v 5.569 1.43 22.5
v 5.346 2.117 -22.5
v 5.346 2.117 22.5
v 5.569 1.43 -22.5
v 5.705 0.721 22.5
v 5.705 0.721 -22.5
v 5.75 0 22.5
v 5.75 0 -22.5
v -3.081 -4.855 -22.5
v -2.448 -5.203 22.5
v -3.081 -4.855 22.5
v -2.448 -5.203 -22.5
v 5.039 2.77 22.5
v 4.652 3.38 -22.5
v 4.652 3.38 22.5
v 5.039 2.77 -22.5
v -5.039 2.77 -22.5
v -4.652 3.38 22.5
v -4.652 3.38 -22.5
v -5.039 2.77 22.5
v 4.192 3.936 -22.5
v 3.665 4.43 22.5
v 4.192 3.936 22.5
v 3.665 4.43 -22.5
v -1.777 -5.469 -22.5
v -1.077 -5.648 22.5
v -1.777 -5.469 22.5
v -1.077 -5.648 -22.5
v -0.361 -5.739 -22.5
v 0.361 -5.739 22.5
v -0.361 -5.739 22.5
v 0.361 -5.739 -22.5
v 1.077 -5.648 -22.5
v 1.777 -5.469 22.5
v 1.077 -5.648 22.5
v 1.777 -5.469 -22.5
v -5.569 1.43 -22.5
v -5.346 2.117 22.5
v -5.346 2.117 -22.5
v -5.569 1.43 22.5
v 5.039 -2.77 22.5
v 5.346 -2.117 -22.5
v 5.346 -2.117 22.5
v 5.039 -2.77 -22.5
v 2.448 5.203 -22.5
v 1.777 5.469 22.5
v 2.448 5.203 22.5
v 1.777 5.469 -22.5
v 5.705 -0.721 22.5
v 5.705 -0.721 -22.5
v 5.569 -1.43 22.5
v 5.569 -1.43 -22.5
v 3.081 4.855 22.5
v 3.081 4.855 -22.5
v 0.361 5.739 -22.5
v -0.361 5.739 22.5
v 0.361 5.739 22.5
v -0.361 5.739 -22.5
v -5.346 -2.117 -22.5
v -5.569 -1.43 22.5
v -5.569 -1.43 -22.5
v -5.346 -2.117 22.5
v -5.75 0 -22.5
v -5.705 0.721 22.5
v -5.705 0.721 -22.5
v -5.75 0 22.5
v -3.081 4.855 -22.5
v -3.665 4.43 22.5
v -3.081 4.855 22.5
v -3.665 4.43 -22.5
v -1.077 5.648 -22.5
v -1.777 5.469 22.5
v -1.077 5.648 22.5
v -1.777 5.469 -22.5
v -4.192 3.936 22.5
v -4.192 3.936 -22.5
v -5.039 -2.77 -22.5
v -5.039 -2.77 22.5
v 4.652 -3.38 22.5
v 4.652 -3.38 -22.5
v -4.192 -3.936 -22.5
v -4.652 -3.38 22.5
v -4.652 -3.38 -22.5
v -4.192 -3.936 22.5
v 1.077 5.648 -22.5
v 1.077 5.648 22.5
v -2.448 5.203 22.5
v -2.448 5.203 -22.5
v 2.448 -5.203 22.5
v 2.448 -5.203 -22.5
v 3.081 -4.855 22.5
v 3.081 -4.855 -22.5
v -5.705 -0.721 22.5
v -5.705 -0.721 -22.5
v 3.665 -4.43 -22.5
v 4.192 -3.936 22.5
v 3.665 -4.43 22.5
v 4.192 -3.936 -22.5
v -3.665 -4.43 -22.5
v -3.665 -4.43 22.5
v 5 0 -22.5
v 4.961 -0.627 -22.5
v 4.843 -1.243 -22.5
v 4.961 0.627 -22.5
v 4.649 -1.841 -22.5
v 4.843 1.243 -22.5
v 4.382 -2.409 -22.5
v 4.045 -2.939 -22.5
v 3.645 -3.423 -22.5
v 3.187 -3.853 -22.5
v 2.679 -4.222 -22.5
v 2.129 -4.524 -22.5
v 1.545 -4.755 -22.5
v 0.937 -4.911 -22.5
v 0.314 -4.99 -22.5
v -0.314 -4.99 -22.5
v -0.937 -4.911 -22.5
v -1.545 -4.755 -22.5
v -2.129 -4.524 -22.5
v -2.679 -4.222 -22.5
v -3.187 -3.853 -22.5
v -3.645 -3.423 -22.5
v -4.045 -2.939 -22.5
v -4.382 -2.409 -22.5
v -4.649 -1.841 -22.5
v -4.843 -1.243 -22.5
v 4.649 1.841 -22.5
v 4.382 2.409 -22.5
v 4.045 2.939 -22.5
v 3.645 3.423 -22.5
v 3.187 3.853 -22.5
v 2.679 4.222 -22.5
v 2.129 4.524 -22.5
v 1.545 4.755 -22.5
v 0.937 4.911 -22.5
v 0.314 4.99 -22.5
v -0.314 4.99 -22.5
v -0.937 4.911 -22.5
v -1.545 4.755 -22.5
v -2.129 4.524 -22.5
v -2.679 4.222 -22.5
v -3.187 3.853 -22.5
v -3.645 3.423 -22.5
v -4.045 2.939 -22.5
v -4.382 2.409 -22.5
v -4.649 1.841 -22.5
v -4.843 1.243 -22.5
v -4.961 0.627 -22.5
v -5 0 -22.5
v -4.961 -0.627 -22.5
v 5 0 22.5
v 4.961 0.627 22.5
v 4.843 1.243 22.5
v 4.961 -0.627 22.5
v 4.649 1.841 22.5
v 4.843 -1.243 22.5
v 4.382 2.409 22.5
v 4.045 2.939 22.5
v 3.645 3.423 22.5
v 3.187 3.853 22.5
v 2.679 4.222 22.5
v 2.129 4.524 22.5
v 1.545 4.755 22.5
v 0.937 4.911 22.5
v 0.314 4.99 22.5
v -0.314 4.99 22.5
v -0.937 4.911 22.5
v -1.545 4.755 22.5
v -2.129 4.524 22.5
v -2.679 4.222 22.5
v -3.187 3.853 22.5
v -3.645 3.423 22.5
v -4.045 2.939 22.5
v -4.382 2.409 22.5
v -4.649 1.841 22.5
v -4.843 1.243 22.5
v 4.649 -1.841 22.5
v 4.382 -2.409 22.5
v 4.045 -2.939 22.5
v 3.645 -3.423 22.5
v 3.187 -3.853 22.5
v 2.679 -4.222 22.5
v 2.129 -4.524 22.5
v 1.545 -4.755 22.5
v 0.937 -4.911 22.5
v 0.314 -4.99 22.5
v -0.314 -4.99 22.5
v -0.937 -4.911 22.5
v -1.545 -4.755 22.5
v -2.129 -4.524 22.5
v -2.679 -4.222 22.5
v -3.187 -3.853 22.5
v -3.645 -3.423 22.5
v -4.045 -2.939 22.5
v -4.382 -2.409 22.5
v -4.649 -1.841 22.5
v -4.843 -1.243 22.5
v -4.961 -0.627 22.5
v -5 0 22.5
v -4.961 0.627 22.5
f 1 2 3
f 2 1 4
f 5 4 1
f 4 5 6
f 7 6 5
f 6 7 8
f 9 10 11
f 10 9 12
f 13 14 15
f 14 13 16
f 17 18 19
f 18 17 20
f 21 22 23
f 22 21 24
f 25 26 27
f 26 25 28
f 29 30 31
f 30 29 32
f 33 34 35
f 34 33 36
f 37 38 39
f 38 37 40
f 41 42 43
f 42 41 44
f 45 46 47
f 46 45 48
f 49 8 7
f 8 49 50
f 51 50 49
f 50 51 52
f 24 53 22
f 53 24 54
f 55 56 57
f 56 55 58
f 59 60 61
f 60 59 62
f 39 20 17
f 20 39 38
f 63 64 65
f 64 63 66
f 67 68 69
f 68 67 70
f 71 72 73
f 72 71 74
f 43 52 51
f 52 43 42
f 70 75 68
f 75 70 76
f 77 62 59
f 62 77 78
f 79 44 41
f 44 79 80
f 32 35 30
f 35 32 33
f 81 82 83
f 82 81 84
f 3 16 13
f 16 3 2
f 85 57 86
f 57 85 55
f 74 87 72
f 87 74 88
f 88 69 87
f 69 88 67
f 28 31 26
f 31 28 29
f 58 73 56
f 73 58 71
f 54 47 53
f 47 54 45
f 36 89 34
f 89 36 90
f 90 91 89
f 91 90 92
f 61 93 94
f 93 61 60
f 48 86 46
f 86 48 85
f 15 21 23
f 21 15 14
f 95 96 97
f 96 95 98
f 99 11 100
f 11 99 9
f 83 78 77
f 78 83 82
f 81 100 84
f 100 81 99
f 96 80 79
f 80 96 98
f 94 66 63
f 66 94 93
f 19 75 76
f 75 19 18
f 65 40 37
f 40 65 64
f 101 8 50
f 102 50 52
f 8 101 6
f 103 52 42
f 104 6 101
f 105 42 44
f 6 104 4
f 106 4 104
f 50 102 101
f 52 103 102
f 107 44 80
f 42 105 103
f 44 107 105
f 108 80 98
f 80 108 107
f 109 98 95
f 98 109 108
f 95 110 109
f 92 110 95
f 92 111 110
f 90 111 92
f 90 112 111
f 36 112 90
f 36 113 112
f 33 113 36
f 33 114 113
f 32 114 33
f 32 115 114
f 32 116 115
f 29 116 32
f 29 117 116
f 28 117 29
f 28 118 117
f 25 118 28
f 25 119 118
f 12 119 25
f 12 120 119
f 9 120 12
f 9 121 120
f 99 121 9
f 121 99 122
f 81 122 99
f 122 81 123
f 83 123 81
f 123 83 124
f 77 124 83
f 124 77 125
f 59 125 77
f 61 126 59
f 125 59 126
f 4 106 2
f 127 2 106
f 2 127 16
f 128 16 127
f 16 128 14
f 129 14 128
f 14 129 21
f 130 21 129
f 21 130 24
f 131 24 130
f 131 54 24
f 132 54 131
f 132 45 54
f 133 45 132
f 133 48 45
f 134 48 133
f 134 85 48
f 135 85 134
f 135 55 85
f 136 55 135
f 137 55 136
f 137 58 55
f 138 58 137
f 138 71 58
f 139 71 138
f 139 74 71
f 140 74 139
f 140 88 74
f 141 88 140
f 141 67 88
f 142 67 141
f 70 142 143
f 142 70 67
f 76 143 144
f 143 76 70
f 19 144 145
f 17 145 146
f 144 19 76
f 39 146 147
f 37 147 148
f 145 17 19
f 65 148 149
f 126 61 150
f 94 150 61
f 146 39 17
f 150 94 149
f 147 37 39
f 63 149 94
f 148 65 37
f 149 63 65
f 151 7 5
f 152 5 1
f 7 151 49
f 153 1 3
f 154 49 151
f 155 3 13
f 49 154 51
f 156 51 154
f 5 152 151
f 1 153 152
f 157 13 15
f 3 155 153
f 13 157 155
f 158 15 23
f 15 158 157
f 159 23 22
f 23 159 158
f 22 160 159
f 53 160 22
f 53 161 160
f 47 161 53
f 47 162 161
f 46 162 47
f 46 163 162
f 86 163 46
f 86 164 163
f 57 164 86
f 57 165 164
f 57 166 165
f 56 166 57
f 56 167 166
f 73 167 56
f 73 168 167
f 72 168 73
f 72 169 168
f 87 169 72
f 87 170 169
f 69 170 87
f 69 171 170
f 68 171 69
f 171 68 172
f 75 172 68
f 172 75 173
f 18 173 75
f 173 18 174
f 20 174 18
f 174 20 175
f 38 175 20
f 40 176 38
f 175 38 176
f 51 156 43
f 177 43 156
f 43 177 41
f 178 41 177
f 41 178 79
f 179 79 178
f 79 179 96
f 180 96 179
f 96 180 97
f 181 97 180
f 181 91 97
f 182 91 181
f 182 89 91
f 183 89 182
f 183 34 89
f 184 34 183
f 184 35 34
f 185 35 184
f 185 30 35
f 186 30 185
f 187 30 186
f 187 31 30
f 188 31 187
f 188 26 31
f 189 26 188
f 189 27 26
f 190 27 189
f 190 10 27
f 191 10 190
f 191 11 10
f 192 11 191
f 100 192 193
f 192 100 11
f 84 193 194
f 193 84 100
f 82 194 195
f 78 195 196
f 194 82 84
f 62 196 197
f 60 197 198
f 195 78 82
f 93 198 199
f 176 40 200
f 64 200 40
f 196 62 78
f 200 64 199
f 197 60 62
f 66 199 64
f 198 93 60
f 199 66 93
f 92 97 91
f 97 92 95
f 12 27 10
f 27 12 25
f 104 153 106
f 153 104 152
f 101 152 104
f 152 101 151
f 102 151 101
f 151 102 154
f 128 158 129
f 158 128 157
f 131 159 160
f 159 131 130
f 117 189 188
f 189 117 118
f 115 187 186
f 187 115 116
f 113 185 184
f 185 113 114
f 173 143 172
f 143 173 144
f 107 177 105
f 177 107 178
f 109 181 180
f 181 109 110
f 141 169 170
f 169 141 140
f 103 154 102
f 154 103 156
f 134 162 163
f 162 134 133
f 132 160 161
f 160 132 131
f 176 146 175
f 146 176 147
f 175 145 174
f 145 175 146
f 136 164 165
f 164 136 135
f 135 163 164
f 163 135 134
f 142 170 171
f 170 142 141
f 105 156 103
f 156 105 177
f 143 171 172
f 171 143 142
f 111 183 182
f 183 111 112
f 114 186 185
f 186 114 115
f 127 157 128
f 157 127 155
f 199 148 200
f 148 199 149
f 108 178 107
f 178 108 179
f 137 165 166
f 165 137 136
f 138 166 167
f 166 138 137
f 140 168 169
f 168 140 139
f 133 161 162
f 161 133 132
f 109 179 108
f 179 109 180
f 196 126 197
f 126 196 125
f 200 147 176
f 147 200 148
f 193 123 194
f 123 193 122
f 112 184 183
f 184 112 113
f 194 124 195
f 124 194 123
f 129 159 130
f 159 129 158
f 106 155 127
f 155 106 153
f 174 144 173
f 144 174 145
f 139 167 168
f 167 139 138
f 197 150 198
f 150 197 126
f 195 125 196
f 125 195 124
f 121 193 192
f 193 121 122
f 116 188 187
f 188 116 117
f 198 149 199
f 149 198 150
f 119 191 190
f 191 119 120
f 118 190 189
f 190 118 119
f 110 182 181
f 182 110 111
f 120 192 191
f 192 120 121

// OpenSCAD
$fn = 50;


difference() {
	union() {
		translate(v = [0, 0, -22.5000000000]) {
			cylinder(h = 45, r = 5.7500000000);
		}
	}
	union() {
		translate(v = [0, 0, -100.0000000000]) {
			cylinder(h = 200, r = 5.0000000000);
		}
	}
}
